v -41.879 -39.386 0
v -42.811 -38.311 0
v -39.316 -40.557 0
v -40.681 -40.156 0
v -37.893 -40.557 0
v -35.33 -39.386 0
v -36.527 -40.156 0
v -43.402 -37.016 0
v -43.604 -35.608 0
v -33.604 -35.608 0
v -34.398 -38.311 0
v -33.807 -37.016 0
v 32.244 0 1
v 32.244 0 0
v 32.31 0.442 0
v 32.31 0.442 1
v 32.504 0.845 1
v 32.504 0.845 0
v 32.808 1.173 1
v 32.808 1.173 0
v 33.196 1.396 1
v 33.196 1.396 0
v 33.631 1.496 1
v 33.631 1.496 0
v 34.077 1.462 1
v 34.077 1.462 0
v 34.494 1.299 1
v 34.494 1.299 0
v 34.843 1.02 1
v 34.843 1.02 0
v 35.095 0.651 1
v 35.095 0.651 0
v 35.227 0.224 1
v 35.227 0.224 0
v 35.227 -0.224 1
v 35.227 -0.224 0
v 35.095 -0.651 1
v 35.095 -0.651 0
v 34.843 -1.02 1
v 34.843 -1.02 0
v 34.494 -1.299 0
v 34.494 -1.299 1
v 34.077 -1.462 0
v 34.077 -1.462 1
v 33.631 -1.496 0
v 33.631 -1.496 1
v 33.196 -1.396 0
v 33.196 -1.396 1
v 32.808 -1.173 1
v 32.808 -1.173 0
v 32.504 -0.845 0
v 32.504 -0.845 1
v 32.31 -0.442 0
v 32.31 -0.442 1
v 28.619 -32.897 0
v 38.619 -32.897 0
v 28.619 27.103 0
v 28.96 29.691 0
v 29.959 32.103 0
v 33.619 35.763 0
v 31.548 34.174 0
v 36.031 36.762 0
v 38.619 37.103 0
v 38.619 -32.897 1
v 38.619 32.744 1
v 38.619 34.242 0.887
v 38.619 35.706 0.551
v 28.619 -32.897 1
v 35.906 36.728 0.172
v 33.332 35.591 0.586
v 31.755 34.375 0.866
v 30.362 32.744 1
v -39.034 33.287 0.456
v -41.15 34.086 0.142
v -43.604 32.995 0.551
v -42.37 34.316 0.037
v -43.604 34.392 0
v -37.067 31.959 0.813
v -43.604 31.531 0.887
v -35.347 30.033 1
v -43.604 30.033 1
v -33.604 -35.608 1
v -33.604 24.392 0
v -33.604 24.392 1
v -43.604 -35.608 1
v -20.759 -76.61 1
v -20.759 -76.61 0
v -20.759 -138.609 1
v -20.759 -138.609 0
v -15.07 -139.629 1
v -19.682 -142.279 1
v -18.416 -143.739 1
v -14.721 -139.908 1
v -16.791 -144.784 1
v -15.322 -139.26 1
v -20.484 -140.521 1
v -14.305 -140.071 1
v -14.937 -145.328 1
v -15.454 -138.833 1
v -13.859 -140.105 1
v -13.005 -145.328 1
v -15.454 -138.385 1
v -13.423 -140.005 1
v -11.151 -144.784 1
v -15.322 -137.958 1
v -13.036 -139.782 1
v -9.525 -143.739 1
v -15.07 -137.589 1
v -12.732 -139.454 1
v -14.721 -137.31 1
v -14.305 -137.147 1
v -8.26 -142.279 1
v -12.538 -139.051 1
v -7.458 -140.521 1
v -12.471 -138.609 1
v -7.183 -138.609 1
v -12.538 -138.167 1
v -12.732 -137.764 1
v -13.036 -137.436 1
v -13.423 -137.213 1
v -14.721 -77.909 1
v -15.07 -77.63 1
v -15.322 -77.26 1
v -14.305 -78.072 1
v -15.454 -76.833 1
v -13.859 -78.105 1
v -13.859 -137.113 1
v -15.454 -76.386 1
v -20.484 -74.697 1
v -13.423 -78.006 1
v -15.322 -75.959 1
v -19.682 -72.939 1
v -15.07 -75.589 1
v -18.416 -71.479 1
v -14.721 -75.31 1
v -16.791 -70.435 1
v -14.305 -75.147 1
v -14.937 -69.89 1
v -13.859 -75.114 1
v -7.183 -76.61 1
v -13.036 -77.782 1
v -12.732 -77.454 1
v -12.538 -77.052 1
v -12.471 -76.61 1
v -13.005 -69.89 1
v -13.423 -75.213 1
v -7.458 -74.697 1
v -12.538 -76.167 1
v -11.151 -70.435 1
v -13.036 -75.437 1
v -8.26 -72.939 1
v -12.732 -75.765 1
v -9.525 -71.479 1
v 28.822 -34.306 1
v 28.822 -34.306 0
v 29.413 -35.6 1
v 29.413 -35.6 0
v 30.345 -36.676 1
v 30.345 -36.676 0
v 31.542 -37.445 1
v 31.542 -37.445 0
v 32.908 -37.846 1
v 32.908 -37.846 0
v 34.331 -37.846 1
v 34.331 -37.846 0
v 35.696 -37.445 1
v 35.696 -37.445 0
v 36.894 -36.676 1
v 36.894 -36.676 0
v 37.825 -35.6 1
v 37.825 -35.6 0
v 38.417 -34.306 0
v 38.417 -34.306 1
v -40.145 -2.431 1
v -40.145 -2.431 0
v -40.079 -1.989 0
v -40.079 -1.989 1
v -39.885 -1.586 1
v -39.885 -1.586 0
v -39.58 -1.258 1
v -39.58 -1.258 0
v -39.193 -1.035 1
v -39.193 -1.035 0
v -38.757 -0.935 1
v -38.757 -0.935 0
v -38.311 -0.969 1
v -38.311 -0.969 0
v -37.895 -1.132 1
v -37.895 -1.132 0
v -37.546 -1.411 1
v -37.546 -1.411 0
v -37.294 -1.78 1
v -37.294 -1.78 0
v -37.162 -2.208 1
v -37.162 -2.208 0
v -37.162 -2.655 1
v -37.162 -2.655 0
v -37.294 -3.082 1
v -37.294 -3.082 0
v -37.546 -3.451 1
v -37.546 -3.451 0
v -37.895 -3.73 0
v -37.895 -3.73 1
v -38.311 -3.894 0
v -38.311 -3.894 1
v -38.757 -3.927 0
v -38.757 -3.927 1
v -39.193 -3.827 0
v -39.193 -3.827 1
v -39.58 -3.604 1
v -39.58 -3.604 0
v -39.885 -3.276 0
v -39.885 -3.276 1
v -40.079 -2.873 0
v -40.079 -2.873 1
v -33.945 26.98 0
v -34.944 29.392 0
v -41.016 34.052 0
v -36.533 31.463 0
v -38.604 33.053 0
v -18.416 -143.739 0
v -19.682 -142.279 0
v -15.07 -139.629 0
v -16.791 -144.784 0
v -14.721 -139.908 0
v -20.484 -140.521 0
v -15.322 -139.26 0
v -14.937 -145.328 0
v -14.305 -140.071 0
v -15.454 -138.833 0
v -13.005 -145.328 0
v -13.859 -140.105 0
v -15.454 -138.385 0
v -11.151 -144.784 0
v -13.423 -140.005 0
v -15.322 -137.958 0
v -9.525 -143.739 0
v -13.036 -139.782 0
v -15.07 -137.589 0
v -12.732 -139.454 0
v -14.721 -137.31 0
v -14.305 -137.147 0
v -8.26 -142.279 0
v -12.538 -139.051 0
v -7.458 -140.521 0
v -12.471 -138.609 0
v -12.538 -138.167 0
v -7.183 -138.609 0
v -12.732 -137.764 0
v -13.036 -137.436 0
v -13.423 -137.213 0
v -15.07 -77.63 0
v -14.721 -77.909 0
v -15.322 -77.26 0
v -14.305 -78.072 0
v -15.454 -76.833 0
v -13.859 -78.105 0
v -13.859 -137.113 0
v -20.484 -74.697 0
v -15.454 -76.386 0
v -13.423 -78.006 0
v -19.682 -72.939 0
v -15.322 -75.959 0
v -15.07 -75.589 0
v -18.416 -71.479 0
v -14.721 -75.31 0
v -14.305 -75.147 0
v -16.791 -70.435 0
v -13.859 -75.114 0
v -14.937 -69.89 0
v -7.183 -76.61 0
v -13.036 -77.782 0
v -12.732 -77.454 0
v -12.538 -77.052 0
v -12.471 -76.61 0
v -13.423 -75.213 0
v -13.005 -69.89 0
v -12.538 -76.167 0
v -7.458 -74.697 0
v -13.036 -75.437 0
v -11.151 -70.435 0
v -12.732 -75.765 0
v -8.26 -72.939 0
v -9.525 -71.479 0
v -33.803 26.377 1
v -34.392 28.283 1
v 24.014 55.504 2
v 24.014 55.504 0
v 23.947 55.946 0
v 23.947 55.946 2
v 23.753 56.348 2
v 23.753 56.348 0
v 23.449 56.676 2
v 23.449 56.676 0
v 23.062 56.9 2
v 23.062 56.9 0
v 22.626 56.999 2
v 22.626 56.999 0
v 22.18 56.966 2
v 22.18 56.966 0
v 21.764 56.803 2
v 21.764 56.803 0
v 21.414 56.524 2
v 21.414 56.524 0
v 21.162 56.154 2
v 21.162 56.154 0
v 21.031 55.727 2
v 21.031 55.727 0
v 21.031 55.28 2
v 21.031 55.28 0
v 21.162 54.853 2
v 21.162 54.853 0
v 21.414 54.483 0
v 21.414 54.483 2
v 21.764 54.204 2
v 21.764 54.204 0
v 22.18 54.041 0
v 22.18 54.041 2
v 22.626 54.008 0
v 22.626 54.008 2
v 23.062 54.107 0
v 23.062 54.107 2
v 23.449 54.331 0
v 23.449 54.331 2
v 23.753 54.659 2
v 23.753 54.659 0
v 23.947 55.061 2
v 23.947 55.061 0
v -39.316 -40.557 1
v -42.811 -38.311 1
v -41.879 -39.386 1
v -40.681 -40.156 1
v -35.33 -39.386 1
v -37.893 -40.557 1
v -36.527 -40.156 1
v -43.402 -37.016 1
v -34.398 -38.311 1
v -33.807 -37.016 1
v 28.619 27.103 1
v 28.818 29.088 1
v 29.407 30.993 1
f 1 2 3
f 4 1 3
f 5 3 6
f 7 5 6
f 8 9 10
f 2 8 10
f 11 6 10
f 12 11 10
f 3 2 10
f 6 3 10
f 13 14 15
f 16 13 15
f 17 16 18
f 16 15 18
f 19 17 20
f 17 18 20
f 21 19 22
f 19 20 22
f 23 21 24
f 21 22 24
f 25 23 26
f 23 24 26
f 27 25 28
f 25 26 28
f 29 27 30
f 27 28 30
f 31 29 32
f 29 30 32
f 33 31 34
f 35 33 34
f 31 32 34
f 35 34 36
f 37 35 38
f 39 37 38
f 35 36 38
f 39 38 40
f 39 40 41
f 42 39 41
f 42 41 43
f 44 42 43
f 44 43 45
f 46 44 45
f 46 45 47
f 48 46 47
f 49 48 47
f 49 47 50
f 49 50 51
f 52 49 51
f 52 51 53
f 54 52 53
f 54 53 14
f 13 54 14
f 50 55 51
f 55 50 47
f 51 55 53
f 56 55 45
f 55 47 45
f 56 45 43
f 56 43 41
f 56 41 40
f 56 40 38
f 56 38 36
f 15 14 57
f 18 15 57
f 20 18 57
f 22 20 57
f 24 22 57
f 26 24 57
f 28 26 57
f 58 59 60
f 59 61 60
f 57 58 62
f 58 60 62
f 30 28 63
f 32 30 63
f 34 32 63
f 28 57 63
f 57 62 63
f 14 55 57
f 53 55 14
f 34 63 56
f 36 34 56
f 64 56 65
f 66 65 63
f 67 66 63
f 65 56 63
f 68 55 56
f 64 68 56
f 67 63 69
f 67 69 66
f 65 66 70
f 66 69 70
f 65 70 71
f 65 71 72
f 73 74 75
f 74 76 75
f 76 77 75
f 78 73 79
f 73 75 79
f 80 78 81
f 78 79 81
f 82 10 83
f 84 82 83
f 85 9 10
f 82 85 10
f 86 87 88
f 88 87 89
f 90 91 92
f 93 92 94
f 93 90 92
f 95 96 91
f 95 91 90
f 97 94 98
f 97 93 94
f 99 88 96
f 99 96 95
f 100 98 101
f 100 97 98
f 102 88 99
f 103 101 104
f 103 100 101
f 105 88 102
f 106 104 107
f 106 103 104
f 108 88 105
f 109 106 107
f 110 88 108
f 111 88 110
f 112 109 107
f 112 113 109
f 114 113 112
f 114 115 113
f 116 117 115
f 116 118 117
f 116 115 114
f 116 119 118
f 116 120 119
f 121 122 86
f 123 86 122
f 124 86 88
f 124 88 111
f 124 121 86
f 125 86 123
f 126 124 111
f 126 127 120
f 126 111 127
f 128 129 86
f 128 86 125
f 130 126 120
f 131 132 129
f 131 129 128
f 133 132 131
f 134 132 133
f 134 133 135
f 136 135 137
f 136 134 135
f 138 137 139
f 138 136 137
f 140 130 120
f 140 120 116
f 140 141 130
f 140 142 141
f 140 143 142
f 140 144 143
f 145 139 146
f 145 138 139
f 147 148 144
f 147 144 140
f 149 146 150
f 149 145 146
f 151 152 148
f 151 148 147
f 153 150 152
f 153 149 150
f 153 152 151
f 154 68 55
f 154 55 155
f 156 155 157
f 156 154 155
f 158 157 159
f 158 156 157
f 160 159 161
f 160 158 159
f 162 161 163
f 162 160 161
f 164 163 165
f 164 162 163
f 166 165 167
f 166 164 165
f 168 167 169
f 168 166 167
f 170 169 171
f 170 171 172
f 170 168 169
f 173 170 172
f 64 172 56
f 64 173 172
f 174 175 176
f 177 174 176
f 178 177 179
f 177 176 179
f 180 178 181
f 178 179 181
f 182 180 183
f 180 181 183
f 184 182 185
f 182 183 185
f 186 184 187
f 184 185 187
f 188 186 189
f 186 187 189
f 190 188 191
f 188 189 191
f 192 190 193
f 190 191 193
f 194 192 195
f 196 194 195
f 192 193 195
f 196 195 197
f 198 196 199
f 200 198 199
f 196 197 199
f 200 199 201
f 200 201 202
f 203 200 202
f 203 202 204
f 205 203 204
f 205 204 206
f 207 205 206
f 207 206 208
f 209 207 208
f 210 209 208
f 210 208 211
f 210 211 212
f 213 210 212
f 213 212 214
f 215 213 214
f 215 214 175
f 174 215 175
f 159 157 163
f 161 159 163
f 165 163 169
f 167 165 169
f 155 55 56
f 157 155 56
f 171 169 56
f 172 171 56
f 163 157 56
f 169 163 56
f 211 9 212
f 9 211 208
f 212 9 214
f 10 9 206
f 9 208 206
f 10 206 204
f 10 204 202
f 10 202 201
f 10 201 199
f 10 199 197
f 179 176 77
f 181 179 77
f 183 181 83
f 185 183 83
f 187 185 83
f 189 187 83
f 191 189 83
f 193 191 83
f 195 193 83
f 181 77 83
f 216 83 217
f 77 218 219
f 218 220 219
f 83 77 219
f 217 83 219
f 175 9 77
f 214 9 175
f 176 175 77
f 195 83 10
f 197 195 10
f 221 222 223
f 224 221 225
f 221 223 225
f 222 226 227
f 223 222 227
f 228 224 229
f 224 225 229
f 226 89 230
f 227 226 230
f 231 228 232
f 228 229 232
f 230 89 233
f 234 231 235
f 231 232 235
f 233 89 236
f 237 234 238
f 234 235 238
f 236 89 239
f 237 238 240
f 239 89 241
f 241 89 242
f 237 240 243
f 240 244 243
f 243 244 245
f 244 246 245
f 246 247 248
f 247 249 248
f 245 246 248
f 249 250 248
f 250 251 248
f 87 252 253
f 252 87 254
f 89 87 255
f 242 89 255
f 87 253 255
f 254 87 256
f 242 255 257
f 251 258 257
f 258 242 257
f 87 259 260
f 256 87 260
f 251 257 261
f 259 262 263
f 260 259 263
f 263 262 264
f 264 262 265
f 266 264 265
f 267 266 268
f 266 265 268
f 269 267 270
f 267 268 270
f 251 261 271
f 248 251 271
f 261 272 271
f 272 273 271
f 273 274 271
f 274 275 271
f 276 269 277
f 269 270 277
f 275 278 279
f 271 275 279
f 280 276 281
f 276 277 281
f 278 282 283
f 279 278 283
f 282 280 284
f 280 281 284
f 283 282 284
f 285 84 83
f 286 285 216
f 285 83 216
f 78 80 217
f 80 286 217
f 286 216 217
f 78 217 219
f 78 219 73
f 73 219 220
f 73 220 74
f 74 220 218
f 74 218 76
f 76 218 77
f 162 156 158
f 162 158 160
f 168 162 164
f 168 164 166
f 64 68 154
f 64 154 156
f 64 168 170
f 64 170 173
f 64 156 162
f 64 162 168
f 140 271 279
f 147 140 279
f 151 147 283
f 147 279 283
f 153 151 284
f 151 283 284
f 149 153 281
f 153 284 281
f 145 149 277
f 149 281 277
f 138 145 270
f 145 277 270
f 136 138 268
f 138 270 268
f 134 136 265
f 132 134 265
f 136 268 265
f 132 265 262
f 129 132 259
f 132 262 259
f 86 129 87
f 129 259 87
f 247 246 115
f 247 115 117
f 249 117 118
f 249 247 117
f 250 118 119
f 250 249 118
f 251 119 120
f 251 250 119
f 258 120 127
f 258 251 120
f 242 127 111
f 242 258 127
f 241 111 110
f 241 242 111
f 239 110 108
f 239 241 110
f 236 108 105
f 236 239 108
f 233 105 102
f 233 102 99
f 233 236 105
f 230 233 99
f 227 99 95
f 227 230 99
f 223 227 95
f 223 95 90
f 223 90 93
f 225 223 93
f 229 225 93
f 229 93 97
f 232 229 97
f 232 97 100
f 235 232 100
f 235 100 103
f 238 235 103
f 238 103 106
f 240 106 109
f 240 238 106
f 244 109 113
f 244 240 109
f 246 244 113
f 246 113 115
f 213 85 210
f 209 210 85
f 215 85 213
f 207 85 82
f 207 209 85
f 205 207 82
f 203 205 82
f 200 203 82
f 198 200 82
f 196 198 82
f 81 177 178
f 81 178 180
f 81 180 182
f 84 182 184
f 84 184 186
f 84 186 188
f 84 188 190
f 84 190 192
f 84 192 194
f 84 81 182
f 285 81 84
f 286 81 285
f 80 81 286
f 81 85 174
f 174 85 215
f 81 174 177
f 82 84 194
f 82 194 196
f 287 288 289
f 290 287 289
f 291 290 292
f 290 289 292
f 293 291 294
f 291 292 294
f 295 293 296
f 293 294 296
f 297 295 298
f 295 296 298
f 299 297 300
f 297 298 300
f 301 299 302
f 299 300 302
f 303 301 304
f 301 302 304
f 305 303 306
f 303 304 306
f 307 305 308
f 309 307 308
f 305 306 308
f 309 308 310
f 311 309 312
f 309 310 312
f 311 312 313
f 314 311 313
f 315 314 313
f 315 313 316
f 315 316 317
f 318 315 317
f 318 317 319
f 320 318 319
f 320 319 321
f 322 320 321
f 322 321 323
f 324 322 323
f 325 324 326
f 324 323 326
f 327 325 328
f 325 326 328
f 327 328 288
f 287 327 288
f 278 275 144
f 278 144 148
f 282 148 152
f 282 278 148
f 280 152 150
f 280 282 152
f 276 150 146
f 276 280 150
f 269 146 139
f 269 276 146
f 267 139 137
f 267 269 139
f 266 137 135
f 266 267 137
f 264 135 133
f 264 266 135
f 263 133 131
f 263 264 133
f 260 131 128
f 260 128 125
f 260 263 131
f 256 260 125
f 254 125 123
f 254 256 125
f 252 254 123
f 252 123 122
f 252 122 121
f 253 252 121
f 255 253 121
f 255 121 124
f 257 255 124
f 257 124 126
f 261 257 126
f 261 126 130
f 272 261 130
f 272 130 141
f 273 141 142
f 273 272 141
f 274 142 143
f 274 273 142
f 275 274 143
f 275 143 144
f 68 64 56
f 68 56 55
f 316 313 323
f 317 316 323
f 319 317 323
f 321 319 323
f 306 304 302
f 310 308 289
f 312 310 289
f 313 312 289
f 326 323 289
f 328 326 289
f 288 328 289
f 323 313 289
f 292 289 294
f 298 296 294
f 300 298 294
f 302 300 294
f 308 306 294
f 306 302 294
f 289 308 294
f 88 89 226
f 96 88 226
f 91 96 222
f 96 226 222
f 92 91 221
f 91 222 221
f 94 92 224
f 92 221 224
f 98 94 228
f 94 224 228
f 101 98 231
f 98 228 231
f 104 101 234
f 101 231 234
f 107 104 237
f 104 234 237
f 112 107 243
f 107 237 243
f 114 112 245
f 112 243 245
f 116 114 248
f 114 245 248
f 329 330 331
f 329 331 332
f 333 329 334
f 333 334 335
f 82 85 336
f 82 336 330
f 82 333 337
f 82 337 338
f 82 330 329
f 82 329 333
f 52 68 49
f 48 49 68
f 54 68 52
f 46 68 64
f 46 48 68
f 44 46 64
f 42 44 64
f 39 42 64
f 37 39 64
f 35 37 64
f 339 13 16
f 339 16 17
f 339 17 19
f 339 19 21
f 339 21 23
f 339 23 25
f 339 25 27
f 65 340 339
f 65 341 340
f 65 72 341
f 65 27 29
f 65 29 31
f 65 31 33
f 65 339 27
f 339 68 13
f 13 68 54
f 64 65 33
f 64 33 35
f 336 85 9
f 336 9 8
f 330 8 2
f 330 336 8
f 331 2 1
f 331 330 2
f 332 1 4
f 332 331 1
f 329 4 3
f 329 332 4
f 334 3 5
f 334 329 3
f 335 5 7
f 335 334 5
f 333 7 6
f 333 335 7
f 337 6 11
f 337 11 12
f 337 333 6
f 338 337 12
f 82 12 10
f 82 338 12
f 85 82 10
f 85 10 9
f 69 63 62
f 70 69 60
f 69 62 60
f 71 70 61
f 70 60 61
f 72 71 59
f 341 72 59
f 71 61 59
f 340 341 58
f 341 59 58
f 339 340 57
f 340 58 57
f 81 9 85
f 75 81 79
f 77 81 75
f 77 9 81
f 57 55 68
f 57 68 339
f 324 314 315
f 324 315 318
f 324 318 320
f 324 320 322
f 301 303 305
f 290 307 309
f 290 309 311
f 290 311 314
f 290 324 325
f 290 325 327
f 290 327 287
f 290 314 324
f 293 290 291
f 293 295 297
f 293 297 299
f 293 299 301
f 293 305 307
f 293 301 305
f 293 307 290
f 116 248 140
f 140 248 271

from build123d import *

# Parameters (mm, degrees)
F0_W        = 10
F0_H        = 70
F1_DEPTH    = 1
F2_T1_DEPTH = 51
F2_T3_DEPTH = 31.7944947177
F3_W        = 10
F3_H        = 70
F4_DEPTH    = 1
F5_T1_DEPTH = 51
F5_T3_DEPTH = 31.7944947177
F7_D        = 3
F10_D       = 3
F11_R       = 1.5
F12_DEPTH   = 2
F13_R       = 1.5
F14_DEPTH   = 1
F15_DEPTH   = 1
F16_DEPTH   = 1


# Not quite as in the source:
# - a fillet or chamfer that OpenCascade refuses, or shapes differently, is made with other operations: its cross-section is extruded or revolved along the edge and cut away or added


with BuildPart() as f1:
    # F0 (on Top) → F1 (new body)
    with BuildSketch(Plane.XY):
        with Locations((-38.6043904229, -0.6076917052)):
            Rectangle(F0_W, F0_H)
    extrude(amount=F1_DEPTH)

    # F2: fillet of radius 10 on 2 edges, made by hand

    # F2_s2 → F2_t1 (cut)
    with BuildSketch(Plane.XY.offset(-25)):
        with BuildLine():
            ThreePointArc((-33.6043904229, 24.3923082948), (-36.5333226111, 31.4633761066), (-43.6043904229, 34.3923082948))
            Line((-43.6043904229, 34.3923082948), (-33.6043904229, 34.3923082948))
            Line((-33.6043904229, 34.3923082948), (-33.6043904229, 24.3923082948))
        make_face()
    extrude(amount=F2_T1_DEPTH, mode=Mode.SUBTRACT)

    # F2_s4 → F2_t3 (cut)
    with BuildSketch(Plane.YZ.offset(-54.5016377818)):
        with BuildLine():
            ThreePointArc((34.3923082948, 0), (32.2694773287, 0.7467943448), (30.0334093512, 1))
            Line((30.0334093512, 1), (34.3923082948, 1))
            Line((34.3923082948, 1), (34.3923082948, 0))
        make_face()
    extrude(amount=F2_T3_DEPTH, mode=Mode.SUBTRACT)

    # F10 (through all)
    with Locations(Plane.XY.offset(1)):
        with Locations((-38.6452153325, -2.4311314337)):
            Hole(F10_D / 2)


with BuildPart() as f4:
    # F3 (on Top) → F4 (new body)
    with BuildSketch(Plane.XY):
        with Locations((33.6192296806, 2.1030642092)):
            Rectangle(F3_W, F3_H)
    extrude(amount=F4_DEPTH)

    # F5: fillet of radius 10 on 2 edges, made by hand

    # F5_s2 → F5_t1 (cut)
    with BuildSketch(Plane.XY.offset(-25)):
        with BuildLine():
            ThreePointArc((38.6192296806, 37.1030642092), (31.5481618688, 34.1741320211), (28.6192296806, 27.1030642092))
            Line((28.6192296806, 27.1030642092), (28.6192296806, 37.1030642092))
            Line((28.6192296806, 37.1030642092), (38.6192296806, 37.1030642092))
        make_face()
    extrude(amount=F5_T1_DEPTH, mode=Mode.SUBTRACT)

    # F5_s4 → F5_t3 (cut)
    with BuildSketch(Plane.YZ.offset(17.7219823218)):
        with BuildLine():
            ThreePointArc((37.1030642092, 0), (34.9802332432, 0.7467943448), (32.7441652657, 1))
            Line((32.7441652657, 1), (37.1030642092, 1))
            Line((37.1030642092, 1), (37.1030642092, 0))
        make_face()
    extrude(amount=F5_T3_DEPTH, mode=Mode.SUBTRACT)

    # F7 (through all)
    with Locations(Plane.XY.offset(1)):
        with Locations((33.7435789406, 0)):
            Hole(F7_D / 2)


with BuildPart() as f12:
    # F11 (on Top) → F12 (new body)
    with BuildSketch(Plane.XY):
        with Locations((22.5139018148, 55.5035099387)):
            Circle(F11_R)
    extrude(amount=F12_DEPTH)


with BuildPart() as f14:
    # F13 (on Top) → F14 (new body)
    with BuildSketch(Plane.XY):
        with BuildLine():
            ThreePointArc((-7.182598114, -76.6095072031), (-13.9708667994, -69.8212385178), (-20.7591354847, -76.6095072031))
            Line((-20.7591354847, -76.6095072031), (-20.7591354847, -138.6089920998))
            ThreePointArc((-20.7591354847, -138.6089920998), (-13.9708667994, -145.3972607851), (-7.182598114, -138.6089920998))
            Line((-7.182598114, -138.6089920998), (-7.182598114, -76.6095072031))
        make_face()
        with Locations((-13.9708667994, -138.6089920998)):
            Circle(F13_R, mode=Mode.SUBTRACT)
        with Locations((-13.9708667994, -76.6095072031)):
            Circle(F13_R, mode=Mode.SUBTRACT)
    extrude(amount=F14_DEPTH)


with BuildPart() as f15:
    # F6 (on face) → F15 (new body)
    with BuildSketch(Plane.XY.offset(1)):
        with BuildLine():
            Line((38.6192296806, -32.8969357908), (28.6192296806, -32.8969357908))
            ThreePointArc((28.6192296806, -32.8969357908), (33.6192296806, -37.8969357908), (38.6192296806, -32.8969357908))
        make_face()
    extrude(amount=-F15_DEPTH)


with BuildPart() as f16:
    # F8 (on face) → F16 (new body)
    with BuildSketch(Plane.XY.offset(1)):
        with BuildLine():
            ThreePointArc((-43.6043904229, -35.6076917052), (-38.6043904229, -40.6076917052), (-33.6043904229, -35.6076917052))
            Line((-33.6043904229, -35.6076917052), (-43.6043904229, -35.6076917052))
        make_face()
    extrude(amount=-F16_DEPTH)


solid = Compound([f1.part, f4.part, f12.part, f14.part, f15.part, f16.part])
